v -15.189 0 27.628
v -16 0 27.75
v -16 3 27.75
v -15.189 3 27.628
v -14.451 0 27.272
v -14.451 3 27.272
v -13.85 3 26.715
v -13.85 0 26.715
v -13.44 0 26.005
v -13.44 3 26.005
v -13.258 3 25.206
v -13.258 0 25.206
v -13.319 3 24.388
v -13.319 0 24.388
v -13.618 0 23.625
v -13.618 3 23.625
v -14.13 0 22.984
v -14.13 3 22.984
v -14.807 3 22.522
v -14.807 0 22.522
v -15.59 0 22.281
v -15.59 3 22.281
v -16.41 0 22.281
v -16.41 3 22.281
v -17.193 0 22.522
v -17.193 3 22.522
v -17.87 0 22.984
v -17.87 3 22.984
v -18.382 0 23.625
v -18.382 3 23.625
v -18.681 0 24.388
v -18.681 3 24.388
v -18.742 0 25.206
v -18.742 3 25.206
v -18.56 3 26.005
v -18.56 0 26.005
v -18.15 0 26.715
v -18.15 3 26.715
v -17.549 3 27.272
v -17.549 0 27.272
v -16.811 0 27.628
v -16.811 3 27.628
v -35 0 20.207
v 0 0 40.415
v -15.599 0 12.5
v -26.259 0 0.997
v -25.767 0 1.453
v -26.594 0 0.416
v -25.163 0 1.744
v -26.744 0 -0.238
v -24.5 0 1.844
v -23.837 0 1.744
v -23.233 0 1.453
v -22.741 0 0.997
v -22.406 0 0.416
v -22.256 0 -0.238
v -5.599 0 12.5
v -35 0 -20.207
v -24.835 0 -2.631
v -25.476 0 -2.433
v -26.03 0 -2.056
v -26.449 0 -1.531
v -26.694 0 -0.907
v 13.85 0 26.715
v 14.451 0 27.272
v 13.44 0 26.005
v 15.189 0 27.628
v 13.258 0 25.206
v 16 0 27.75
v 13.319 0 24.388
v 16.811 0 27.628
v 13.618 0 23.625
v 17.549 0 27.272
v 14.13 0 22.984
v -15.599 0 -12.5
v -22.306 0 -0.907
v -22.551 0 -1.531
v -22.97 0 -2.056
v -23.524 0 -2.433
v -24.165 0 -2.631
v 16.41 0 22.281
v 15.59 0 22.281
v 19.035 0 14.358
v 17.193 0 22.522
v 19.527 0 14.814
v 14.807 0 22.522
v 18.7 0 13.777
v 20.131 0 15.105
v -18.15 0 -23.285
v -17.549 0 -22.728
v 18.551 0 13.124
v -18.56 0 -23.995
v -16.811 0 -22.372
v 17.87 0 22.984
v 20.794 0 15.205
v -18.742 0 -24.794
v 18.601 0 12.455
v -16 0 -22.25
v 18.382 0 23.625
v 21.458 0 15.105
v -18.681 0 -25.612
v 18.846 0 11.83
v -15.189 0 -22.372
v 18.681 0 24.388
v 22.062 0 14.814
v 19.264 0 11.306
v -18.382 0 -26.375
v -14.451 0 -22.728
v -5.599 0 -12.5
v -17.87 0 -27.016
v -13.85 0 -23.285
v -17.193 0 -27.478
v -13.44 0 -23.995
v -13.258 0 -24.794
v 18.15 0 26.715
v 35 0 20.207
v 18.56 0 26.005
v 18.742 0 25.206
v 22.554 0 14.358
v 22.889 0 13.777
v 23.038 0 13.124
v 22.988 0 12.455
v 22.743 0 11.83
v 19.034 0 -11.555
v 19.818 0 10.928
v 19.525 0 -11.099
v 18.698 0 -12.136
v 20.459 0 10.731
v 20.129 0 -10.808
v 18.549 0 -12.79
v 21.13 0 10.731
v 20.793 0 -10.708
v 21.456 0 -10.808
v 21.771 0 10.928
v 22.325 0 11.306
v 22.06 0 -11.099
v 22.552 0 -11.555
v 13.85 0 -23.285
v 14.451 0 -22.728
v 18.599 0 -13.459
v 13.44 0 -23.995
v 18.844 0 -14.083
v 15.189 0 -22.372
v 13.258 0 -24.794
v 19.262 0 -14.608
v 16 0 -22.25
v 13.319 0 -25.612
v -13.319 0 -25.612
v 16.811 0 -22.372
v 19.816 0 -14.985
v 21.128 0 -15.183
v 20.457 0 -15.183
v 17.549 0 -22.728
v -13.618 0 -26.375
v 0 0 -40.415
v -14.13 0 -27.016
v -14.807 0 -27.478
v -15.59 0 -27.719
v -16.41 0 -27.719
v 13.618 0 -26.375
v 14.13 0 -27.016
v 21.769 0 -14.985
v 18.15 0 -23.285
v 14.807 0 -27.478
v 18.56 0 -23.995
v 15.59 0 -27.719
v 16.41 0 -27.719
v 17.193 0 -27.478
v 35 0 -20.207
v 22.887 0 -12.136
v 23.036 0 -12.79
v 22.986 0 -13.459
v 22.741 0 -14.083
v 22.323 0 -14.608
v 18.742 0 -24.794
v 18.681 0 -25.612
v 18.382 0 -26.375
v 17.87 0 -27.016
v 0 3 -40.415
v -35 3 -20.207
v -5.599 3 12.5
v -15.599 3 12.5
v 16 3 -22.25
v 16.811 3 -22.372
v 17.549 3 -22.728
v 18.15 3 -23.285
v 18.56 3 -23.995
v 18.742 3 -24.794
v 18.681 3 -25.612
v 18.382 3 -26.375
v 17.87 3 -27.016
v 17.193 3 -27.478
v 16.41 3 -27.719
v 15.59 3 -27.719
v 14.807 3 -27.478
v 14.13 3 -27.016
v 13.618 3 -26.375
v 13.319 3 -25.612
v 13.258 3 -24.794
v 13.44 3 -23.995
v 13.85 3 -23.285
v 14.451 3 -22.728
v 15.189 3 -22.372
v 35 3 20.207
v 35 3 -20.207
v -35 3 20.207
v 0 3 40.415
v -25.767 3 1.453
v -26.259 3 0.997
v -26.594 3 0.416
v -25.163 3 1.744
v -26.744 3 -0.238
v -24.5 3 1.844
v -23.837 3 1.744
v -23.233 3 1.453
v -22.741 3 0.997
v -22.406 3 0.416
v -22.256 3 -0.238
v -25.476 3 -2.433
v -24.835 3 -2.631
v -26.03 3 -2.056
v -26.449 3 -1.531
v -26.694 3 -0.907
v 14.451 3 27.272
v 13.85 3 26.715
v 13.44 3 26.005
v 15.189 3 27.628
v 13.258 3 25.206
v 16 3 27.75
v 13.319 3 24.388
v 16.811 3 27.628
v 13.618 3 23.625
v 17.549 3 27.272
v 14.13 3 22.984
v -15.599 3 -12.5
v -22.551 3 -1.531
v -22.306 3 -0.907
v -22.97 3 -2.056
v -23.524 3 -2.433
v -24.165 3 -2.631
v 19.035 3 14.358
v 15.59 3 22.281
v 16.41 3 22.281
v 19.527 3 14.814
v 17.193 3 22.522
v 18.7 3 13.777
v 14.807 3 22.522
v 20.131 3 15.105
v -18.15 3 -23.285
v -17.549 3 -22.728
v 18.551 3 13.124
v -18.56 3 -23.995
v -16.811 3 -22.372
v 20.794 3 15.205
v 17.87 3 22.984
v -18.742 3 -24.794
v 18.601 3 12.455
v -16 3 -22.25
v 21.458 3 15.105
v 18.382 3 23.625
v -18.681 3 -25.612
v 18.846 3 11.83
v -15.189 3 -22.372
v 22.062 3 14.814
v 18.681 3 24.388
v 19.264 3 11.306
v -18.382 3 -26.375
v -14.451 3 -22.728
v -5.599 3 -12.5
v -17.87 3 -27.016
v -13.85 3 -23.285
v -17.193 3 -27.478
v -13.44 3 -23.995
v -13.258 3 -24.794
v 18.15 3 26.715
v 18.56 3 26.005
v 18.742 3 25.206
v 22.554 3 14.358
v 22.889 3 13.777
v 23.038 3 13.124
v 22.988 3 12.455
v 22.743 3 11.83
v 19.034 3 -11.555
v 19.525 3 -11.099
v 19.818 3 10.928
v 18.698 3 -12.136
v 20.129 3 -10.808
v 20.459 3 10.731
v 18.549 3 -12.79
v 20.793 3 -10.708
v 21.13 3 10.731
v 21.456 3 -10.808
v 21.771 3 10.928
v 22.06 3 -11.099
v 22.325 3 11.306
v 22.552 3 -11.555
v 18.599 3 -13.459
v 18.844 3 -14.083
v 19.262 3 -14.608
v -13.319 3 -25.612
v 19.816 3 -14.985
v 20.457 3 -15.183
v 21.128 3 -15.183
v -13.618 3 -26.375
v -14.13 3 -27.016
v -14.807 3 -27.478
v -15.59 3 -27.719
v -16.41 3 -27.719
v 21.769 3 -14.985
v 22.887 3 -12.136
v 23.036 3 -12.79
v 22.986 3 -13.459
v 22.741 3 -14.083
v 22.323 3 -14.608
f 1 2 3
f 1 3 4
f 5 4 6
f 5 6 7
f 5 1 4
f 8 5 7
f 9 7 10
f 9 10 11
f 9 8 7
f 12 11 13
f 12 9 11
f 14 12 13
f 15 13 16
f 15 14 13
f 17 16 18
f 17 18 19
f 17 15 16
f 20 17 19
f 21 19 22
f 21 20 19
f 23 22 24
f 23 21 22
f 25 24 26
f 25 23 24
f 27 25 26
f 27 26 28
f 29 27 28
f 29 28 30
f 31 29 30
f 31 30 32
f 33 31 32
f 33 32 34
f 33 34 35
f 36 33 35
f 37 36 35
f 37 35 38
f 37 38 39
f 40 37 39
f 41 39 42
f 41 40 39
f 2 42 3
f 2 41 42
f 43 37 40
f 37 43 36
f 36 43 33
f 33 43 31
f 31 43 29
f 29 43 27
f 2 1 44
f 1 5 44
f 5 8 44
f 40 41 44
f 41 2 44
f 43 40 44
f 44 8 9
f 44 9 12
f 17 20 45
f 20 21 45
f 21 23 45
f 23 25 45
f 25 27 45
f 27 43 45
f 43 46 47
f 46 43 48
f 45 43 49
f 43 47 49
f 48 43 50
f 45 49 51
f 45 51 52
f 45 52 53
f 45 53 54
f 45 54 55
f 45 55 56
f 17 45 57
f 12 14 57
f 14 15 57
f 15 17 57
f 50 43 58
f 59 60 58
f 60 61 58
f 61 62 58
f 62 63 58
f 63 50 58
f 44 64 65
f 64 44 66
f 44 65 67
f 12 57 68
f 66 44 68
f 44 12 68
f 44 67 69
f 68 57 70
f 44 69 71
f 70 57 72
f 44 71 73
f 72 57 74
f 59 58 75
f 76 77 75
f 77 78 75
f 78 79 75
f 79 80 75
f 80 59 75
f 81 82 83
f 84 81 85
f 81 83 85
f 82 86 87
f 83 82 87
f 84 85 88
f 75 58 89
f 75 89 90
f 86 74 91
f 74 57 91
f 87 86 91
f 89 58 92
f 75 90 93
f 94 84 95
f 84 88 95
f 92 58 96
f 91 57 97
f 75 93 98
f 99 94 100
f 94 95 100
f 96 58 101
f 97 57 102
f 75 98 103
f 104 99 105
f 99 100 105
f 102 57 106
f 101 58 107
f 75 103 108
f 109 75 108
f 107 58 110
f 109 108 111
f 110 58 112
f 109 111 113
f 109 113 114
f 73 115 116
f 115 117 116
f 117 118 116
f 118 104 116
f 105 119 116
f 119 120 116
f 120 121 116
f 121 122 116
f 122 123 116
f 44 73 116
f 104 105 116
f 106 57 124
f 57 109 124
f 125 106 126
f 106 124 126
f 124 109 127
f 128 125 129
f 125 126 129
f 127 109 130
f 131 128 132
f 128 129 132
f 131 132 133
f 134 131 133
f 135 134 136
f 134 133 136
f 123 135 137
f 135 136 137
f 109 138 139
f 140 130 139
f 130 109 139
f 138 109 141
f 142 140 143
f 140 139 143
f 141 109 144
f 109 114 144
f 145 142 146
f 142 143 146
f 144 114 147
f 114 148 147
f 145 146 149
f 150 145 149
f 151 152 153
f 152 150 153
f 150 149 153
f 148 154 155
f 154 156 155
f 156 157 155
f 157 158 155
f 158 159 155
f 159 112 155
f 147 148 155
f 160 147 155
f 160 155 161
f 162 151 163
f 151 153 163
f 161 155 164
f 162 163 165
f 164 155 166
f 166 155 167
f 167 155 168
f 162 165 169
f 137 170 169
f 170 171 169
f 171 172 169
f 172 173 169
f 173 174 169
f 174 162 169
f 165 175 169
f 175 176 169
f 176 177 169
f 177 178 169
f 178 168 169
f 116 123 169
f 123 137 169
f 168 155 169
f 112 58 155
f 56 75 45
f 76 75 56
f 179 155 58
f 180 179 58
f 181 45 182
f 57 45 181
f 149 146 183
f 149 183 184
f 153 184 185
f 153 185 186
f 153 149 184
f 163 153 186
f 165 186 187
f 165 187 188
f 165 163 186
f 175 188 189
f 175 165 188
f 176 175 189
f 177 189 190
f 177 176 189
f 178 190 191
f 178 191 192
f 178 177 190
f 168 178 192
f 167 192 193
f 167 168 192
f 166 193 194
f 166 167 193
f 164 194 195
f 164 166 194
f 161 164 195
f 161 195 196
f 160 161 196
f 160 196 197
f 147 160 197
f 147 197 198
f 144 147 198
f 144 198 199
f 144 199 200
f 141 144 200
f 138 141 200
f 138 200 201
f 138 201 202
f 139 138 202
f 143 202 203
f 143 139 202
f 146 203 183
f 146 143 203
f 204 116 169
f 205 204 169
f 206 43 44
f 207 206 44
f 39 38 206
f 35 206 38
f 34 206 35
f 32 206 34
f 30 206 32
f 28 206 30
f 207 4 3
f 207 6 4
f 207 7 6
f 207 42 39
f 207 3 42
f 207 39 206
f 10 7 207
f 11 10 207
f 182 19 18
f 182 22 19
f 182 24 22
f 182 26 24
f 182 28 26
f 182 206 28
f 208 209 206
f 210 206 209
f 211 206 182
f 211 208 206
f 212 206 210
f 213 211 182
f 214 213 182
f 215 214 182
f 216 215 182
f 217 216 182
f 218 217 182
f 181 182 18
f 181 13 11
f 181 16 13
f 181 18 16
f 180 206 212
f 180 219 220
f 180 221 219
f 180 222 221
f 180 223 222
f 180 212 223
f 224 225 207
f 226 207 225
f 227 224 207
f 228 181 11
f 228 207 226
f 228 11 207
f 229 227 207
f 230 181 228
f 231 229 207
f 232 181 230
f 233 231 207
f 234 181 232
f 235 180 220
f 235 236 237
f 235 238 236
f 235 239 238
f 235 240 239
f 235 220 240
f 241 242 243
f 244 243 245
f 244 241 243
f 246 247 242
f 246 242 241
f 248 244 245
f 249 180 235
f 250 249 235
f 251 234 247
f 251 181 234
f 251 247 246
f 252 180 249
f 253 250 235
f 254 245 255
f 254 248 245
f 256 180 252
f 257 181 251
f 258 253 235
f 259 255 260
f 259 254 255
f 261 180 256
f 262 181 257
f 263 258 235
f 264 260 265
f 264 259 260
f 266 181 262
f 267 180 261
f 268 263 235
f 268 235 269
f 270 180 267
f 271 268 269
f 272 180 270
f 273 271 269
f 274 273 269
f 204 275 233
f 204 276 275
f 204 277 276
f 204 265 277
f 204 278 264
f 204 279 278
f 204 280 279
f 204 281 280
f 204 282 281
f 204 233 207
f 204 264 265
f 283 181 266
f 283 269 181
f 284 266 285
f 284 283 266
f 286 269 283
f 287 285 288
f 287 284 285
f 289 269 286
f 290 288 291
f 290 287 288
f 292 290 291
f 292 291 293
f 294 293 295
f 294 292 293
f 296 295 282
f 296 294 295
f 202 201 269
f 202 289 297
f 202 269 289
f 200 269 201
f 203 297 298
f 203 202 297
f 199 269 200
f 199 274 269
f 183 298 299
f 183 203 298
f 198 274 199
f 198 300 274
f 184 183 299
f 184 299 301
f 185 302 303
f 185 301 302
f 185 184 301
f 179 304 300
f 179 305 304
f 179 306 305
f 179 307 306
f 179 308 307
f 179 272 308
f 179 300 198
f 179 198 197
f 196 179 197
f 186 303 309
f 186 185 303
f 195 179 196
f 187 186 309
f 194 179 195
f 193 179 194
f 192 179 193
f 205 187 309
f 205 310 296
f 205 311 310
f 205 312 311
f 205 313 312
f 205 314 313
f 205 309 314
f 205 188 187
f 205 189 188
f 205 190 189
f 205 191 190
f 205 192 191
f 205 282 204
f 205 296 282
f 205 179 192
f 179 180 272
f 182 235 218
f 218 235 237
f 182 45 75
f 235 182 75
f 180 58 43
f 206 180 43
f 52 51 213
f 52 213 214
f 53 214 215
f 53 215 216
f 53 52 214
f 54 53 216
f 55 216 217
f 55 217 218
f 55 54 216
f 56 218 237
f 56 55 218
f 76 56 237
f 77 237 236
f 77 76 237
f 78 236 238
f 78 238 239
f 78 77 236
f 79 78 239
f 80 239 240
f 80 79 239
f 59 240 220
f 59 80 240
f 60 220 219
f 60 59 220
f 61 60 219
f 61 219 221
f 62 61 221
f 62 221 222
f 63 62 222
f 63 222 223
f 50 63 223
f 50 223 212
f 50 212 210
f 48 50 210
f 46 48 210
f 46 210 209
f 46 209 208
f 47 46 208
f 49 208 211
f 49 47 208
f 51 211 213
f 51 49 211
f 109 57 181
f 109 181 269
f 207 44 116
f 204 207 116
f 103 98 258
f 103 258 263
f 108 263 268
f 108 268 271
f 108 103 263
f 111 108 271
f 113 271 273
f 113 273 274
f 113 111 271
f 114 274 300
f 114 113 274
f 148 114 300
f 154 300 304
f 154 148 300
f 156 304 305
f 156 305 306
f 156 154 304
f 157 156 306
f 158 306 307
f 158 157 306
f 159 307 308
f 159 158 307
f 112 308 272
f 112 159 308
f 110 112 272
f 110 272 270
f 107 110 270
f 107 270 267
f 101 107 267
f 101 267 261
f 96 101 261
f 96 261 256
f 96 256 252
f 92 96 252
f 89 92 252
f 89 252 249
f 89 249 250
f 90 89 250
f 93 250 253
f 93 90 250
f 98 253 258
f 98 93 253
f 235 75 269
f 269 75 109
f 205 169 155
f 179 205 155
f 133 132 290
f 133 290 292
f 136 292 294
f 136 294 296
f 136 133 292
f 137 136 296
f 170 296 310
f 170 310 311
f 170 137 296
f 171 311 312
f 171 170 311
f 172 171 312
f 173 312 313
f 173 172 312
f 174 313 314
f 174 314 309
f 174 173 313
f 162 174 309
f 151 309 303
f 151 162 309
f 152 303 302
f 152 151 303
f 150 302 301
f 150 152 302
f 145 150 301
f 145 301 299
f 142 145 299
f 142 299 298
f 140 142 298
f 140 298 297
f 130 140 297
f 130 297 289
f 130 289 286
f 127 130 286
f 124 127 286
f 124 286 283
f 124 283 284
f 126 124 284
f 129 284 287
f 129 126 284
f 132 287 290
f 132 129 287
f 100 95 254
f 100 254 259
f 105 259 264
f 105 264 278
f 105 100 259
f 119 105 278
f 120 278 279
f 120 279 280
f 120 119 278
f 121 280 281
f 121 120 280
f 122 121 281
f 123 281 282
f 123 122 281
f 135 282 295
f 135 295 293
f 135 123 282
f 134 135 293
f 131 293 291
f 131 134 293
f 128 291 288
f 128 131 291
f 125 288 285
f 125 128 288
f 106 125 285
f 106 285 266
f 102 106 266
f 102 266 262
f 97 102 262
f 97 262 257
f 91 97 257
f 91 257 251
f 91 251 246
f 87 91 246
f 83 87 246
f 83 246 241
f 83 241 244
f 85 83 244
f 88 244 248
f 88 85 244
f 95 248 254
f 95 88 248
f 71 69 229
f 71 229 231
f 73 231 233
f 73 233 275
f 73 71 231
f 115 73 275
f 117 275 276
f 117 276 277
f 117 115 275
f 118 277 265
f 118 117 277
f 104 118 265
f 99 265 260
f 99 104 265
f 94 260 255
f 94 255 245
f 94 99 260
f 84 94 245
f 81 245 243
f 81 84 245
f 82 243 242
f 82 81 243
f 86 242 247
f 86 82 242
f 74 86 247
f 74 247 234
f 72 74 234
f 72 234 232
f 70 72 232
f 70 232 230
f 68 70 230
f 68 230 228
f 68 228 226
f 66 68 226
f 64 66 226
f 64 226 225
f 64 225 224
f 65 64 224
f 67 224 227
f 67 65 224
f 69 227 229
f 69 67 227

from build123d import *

# Parameters (mm, degrees)
SKETCH1_R           = 2.25
SKETCH1_R_2         = 2.75
SKETCH1_W           = 10
SKETCH1_H           = 25
BOSS_EXTRUDE1_DEPTH = 3


with BuildPart() as part:
    # Sketch1 → Boss-Extrude1 (new body)
    with BuildSketch(Plane(origin=(0, 0, 0), x_dir=(1, 0, 0), z_dir=(0, 1, 0))):
        Polygon((0, -40.414518843), (35, -20.207259422), (35, 20.207259422), (0, 40.414518843), (-35, 20.207259422), (-35, -20.207259422), align=None)
        with Locations(Location((20.792689758, 12.958165481, 0), (0, 0, 270))):
            Circle(SKETCH1_R, mode=Mode.SUBTRACT)
        with Locations(Location((20.794392615, -12.955432674, 0), (0, 0, 270))):
            Circle(SKETCH1_R, mode=Mode.SUBTRACT)
        with Locations(Location((-24.5, 0.406188596, 0), (0, 0, 270))):
            Circle(SKETCH1_R, mode=Mode.SUBTRACT)
        with Locations(Location((-16, 25, 0), (0, 0, 270))):
            Circle(SKETCH1_R_2, mode=Mode.SUBTRACT)
        with Locations(Location((16, 25, 0), (0, 0, 270))):
            Circle(SKETCH1_R_2, mode=Mode.SUBTRACT)
        with Locations(Location((-16, -25, 0), (0, 0, 270))):
            Circle(SKETCH1_R_2, mode=Mode.SUBTRACT)
        with Locations(Location((16, -25, 0), (0, 0, 270))):
            Circle(SKETCH1_R_2, mode=Mode.SUBTRACT)
        with Locations((-10.599366241, 0)):
            Rectangle(SKETCH1_W, SKETCH1_H, mode=Mode.SUBTRACT)
    extrude(amount=BOSS_EXTRUDE1_DEPTH)


solid = part.part
